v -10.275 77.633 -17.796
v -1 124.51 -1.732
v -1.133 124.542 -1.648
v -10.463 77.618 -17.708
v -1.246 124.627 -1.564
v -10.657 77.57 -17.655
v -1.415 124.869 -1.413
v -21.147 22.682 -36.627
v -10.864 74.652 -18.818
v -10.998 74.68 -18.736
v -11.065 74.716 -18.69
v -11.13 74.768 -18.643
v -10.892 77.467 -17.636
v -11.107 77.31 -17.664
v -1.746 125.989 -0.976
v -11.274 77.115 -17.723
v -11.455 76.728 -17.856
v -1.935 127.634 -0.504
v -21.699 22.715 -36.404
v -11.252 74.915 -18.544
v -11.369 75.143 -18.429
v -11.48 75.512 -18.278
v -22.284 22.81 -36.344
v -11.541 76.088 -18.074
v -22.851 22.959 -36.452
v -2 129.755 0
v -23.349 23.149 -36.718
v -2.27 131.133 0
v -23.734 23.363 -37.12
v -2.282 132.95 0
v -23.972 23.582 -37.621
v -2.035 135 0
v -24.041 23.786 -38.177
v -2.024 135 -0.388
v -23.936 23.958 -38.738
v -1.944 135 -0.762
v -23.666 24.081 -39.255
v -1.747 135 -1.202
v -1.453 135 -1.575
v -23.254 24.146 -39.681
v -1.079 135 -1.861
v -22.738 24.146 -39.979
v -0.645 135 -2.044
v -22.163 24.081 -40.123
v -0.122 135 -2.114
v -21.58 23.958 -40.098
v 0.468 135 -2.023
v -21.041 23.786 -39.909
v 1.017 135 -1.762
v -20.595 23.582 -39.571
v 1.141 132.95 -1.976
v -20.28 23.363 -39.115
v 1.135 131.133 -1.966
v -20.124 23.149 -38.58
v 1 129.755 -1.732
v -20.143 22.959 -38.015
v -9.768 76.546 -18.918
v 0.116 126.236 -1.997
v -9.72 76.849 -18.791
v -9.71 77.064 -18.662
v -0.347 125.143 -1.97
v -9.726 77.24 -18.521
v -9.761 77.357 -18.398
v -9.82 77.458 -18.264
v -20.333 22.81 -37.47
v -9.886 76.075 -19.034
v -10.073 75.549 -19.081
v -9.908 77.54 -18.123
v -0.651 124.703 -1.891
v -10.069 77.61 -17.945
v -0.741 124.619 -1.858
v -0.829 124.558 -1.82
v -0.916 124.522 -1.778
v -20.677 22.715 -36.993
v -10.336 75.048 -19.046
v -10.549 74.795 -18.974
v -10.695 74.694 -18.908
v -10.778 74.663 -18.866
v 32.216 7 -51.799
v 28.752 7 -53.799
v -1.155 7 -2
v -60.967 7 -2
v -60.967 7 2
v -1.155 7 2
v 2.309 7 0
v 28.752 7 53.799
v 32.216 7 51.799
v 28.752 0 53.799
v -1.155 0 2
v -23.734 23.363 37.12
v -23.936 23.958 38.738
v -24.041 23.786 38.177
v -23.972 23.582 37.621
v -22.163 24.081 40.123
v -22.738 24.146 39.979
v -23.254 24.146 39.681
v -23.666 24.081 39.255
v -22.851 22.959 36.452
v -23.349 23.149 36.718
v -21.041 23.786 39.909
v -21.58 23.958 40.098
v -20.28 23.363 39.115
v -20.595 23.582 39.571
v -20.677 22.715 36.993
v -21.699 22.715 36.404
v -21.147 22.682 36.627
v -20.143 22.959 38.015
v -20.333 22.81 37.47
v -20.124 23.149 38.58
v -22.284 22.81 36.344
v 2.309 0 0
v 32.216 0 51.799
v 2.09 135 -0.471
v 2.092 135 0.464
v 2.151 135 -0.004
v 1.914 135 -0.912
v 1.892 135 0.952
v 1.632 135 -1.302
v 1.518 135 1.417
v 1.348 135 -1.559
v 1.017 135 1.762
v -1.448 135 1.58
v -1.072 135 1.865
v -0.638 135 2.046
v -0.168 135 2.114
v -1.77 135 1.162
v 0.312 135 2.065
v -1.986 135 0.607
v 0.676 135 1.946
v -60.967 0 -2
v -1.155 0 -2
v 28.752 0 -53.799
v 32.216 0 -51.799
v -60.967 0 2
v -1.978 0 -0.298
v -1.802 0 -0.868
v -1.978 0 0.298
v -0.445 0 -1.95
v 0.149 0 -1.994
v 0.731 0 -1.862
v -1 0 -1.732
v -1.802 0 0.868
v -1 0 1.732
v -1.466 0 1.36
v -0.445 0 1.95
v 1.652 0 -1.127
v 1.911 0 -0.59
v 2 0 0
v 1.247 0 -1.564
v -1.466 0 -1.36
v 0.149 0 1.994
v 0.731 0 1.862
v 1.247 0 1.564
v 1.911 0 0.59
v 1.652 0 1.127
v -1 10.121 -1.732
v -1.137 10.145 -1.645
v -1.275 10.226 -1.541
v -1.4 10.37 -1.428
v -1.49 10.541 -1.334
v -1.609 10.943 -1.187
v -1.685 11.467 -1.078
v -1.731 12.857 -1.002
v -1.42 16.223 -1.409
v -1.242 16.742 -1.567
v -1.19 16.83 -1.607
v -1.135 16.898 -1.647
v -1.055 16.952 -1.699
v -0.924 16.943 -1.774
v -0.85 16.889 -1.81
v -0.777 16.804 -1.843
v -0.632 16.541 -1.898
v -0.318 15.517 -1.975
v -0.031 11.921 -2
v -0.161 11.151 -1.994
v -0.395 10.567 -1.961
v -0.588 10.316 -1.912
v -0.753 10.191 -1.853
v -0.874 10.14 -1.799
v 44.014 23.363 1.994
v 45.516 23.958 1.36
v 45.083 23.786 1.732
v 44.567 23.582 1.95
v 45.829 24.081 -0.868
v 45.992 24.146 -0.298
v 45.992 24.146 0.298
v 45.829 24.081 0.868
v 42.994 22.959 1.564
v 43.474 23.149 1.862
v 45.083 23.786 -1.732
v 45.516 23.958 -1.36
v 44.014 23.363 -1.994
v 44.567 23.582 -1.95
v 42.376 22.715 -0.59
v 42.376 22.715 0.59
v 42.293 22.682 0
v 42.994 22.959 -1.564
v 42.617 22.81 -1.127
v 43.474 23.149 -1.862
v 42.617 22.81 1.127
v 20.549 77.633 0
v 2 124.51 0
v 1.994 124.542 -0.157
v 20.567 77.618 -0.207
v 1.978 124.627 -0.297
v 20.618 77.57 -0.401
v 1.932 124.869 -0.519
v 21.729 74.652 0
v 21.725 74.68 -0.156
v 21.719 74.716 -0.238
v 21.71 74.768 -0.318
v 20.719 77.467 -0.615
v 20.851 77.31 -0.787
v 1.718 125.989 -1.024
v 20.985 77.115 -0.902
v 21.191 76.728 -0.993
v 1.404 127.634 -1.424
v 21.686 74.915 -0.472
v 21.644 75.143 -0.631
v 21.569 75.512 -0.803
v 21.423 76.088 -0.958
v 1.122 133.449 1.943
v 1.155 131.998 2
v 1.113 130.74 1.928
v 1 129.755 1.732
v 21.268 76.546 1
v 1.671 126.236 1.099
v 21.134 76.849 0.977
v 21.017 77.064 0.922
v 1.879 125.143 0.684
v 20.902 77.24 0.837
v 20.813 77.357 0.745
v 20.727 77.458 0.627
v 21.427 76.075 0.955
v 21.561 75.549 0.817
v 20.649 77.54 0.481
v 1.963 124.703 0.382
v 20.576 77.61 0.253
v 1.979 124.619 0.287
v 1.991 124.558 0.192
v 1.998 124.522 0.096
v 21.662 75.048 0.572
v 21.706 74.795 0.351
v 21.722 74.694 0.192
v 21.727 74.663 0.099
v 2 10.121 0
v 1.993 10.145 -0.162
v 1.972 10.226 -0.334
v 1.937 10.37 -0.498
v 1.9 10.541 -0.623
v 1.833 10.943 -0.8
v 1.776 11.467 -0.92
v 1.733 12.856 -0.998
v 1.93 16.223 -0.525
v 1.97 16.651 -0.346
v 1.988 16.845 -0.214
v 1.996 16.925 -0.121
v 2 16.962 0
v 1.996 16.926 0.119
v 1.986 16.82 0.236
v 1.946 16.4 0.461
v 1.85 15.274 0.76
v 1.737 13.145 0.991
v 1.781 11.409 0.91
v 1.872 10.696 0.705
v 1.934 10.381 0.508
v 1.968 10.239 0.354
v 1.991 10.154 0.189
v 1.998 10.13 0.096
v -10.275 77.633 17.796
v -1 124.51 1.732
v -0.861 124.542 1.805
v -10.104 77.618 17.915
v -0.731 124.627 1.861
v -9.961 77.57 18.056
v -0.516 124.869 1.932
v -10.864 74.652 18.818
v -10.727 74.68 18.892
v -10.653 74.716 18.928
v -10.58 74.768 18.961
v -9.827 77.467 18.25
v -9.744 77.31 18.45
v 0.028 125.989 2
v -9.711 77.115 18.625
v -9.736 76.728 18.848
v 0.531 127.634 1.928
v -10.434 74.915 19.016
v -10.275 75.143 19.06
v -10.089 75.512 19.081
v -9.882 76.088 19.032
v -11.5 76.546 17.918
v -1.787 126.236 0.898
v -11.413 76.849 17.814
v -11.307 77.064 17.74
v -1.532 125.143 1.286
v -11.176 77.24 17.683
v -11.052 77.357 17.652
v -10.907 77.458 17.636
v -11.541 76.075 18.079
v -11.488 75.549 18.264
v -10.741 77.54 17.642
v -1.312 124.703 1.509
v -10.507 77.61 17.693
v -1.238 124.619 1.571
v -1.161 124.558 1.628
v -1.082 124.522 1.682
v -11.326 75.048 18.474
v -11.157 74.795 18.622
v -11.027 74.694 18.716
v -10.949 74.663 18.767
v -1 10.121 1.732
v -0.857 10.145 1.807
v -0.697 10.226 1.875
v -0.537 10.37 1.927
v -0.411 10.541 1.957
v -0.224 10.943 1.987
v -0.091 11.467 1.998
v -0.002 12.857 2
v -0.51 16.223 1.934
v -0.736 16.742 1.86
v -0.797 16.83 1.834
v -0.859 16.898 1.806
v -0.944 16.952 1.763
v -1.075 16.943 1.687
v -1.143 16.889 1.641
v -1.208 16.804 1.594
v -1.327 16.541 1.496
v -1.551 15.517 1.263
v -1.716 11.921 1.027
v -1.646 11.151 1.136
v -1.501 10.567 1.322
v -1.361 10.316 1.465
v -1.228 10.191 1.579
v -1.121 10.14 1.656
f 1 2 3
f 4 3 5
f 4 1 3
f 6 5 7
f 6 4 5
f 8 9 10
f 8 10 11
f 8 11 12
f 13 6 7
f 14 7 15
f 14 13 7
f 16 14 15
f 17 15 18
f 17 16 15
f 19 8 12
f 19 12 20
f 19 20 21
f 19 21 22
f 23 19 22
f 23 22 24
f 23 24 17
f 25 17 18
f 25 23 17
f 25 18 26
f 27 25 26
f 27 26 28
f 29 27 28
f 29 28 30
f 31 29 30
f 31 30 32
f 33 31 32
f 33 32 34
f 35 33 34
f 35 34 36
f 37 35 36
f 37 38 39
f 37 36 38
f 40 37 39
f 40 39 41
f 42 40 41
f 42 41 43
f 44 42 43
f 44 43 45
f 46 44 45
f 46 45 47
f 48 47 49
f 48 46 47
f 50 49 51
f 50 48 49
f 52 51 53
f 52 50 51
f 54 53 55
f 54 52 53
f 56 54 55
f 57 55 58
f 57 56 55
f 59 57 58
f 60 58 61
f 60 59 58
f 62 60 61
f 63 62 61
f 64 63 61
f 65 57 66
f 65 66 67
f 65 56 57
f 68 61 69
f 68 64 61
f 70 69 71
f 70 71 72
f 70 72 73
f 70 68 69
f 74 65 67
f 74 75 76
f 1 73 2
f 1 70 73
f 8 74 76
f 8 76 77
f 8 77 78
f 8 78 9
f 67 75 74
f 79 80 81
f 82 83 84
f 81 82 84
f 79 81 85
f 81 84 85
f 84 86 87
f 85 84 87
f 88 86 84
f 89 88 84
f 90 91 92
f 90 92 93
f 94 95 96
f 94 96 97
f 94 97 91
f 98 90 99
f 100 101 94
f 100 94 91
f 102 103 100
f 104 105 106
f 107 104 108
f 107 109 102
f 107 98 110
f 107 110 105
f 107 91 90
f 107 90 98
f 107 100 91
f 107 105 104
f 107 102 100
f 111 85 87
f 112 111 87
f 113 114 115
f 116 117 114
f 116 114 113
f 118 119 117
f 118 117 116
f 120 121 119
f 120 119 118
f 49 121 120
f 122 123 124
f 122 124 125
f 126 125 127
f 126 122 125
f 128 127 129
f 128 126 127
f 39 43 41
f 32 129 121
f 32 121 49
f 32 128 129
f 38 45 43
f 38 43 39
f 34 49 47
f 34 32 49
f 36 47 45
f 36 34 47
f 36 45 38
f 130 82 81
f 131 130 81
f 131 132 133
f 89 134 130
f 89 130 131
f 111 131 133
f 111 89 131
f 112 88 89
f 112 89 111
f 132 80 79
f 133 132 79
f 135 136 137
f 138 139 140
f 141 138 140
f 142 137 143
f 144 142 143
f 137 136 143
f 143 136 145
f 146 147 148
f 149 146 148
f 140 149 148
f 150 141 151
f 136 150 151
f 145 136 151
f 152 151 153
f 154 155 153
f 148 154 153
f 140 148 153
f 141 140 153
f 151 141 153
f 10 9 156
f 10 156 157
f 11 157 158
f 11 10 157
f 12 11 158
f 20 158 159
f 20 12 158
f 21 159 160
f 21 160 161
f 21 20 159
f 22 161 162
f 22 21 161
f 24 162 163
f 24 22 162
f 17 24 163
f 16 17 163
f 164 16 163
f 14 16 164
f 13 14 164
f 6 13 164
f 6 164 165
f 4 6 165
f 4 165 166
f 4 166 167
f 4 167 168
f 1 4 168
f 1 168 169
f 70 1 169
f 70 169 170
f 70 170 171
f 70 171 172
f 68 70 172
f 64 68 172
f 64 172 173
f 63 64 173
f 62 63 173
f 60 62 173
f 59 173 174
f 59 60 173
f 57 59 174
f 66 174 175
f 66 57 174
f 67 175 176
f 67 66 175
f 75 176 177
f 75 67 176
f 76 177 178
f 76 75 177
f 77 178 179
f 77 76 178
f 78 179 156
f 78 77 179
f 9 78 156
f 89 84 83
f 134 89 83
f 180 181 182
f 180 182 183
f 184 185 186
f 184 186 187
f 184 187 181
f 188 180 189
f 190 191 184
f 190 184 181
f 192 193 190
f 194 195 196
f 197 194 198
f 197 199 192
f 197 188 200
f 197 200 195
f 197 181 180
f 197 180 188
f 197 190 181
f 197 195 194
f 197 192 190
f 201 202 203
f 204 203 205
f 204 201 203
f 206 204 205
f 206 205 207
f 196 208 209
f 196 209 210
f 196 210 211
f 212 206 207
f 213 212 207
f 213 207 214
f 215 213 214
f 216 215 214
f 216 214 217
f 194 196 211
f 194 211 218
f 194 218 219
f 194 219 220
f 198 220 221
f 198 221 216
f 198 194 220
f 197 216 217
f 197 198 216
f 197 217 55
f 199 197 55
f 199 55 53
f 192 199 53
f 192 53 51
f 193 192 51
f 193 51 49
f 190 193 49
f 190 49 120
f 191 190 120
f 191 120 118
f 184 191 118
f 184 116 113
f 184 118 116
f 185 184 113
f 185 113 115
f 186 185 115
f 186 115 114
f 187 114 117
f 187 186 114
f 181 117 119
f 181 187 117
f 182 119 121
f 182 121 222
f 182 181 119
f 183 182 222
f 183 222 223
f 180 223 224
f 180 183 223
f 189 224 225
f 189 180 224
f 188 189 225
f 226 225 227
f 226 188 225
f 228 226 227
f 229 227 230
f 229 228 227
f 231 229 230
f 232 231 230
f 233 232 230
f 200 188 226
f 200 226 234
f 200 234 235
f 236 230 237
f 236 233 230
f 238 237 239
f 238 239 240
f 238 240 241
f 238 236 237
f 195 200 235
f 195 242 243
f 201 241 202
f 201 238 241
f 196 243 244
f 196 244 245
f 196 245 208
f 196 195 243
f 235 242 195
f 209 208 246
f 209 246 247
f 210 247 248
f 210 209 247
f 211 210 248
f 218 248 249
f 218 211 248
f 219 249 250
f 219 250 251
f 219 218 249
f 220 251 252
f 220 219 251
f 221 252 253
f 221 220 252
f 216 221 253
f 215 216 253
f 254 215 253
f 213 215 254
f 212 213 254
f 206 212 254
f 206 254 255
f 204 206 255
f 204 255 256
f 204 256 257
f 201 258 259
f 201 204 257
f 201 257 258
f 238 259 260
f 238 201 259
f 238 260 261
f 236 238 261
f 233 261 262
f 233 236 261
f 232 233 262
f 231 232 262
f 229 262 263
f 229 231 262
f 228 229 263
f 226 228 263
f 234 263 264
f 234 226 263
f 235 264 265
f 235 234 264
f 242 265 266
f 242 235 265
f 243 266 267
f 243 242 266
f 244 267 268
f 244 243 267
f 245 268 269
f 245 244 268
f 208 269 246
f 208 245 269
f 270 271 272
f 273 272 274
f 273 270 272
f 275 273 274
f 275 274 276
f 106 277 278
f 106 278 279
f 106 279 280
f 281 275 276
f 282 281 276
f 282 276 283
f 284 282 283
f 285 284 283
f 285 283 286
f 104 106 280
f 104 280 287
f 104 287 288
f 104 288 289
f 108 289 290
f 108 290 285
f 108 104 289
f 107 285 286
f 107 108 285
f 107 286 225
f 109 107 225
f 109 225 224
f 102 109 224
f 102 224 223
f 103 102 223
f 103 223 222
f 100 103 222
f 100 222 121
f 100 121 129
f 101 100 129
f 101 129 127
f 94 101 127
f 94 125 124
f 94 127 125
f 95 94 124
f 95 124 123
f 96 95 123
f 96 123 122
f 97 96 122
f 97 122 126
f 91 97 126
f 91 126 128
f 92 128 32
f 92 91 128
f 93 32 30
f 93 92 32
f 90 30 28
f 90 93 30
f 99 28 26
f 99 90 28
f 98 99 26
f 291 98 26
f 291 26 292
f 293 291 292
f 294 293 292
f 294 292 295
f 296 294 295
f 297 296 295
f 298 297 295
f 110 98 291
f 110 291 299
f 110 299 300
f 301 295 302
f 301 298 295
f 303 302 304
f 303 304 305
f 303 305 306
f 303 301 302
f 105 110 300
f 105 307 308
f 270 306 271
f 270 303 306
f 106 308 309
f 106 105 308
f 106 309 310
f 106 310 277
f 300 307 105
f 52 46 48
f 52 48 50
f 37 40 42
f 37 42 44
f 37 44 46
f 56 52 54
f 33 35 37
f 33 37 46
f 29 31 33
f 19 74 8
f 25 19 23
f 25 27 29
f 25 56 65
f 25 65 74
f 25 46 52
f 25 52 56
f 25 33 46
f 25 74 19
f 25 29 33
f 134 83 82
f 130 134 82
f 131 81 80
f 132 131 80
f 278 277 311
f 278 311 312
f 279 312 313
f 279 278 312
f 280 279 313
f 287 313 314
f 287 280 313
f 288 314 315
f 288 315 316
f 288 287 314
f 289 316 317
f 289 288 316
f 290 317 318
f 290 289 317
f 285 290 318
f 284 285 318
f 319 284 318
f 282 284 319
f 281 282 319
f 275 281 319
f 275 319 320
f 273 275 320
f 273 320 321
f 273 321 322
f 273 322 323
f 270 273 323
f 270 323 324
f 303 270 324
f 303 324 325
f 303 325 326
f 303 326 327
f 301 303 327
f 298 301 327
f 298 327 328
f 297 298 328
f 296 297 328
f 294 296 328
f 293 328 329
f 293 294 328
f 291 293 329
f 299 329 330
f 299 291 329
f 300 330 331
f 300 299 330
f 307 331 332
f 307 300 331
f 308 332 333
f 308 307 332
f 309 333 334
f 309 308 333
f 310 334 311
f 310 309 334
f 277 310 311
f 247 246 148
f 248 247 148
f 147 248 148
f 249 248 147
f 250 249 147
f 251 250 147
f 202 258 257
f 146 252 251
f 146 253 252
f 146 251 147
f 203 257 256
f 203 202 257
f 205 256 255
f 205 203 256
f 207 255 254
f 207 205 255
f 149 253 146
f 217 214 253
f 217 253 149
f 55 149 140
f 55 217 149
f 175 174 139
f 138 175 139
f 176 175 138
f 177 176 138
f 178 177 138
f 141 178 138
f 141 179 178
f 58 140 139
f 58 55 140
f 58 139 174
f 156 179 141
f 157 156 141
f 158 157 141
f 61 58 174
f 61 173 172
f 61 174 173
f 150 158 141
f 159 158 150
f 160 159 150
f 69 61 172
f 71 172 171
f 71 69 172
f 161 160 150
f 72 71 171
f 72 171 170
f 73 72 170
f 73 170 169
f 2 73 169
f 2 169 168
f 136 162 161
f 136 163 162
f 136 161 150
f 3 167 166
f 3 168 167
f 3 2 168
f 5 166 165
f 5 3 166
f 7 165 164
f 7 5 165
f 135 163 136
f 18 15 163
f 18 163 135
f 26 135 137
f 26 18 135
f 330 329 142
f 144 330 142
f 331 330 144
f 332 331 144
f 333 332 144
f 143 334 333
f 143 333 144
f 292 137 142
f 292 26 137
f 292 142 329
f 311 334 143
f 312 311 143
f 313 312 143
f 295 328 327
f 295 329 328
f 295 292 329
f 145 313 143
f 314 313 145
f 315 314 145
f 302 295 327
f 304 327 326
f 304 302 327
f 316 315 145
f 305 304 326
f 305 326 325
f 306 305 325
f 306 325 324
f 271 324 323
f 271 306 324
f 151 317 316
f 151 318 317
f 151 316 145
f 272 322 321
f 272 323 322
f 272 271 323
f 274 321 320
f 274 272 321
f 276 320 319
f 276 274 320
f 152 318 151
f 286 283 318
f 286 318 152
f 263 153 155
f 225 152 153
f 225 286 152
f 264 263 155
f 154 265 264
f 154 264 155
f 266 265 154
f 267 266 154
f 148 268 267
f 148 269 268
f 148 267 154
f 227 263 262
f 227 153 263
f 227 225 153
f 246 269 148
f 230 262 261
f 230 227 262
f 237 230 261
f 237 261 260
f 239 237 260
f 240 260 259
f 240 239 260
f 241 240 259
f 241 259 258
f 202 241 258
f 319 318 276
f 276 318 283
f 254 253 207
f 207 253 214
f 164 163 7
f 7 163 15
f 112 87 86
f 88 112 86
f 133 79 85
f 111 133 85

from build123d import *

# Parameters (mm, degrees)
SWEEP1_PROFILE_R    = 2
SWEEP2_PROFILE_R    = 1
CUT_EXTRUDE3_START  = -15
SKETCH50_R          = 5.464476383
CUT_EXTRUDE3_DEPTH  = 10.489956
CIRPATTERN2_COUNT   = 3
BOSS_EXTRUDE1_START = -7
BOSS_EXTRUDE1_DEPTH = 7


# Read off the part's stored shape, not the designer's step: Boss-Extrude1
with BuildPart() as part:
    # Sweep1: sweep along a curve in space
    with BuildLine() as sweep1_path:
        Line((0, 0, 0), (0, 135, 0))
        Line((0, 135, 0), (44.153062384, 23.418159712, 0))
    # Sweep1 profile (on start of the path) → Sweep1 (sweep)
    with BuildSketch(Plane(origin=(0, 0, 0), x_dir=(1, 0, 0), z_dir=(0, 1, 0))):
        Circle(SWEEP1_PROFILE_R)
    sweep1 = sweep(path=sweep1_path.line, transition=Transition.RIGHT)

    # Sweep2: sweep along a curve in space
    with BuildLine() as sweep2_path:
        Line((0, 7, 0), (22.076531192, 79.209079856, 0))
    # Sweep2 profile (on start of the path) → Sweep2 (sweep)
    with BuildSketch(Plane(origin=(0, 7, 0), x_dir=(0.9563047559630352, -0.2923717047227375, 0), z_dir=(0.2923717047227375, 0.9563047559630352, 0))):
        Circle(SWEEP2_PROFILE_R)
    sweep2 = sweep(path=sweep2_path.line)

    # Sketch50 → Cut-Extrude3 (cut)
    with BuildSketch(Plane(origin=(0, 150, 0), x_dir=(1, 0, 0), z_dir=(0, 1, 0)).offset(CUT_EXTRUDE3_START)):
        Circle(SKETCH50_R)
    cut_extrude3 = extrude(amount=CUT_EXTRUDE3_DEPTH, mode=Mode.SUBTRACT)

    # CirPattern2: Sweep1, Sweep2, Cut-Extrude3 ×3 about axis
    cirpattern2_axis = Axis((0, 0, 0), (0, 1, 0))
    add([sweep1.rotate(cirpattern2_axis, i * 360 / CIRPATTERN2_COUNT) for i in range(1, CIRPATTERN2_COUNT)])
    add([sweep2.rotate(cirpattern2_axis, i * 360 / CIRPATTERN2_COUNT) for i in range(1, CIRPATTERN2_COUNT)])
    add([cut_extrude3.rotate(cirpattern2_axis, i * 360 / CIRPATTERN2_COUNT) for i in range(1, CIRPATTERN2_COUNT)], mode=Mode.SUBTRACT)


with BuildPart() as body_2:
    # Boss-Extrude1 outline → Boss-Extrude1 (new body)
    with BuildSketch(Plane.XZ.offset(BOSS_EXTRUDE1_START)):
        Polygon((28.751551342, 53.79914772), (-1.154700538, 2), (-60.967204299, 2), (-60.967204299, -2), (-1.154700538, -2), (28.751551342, -53.79914772), (32.215652957, -51.79914772), (2.309401077, 0), (32.215652957, 51.79914772), align=None)
    extrude(amount=BOSS_EXTRUDE1_DEPTH)


solid = Compound([part.part, body_2.part])
